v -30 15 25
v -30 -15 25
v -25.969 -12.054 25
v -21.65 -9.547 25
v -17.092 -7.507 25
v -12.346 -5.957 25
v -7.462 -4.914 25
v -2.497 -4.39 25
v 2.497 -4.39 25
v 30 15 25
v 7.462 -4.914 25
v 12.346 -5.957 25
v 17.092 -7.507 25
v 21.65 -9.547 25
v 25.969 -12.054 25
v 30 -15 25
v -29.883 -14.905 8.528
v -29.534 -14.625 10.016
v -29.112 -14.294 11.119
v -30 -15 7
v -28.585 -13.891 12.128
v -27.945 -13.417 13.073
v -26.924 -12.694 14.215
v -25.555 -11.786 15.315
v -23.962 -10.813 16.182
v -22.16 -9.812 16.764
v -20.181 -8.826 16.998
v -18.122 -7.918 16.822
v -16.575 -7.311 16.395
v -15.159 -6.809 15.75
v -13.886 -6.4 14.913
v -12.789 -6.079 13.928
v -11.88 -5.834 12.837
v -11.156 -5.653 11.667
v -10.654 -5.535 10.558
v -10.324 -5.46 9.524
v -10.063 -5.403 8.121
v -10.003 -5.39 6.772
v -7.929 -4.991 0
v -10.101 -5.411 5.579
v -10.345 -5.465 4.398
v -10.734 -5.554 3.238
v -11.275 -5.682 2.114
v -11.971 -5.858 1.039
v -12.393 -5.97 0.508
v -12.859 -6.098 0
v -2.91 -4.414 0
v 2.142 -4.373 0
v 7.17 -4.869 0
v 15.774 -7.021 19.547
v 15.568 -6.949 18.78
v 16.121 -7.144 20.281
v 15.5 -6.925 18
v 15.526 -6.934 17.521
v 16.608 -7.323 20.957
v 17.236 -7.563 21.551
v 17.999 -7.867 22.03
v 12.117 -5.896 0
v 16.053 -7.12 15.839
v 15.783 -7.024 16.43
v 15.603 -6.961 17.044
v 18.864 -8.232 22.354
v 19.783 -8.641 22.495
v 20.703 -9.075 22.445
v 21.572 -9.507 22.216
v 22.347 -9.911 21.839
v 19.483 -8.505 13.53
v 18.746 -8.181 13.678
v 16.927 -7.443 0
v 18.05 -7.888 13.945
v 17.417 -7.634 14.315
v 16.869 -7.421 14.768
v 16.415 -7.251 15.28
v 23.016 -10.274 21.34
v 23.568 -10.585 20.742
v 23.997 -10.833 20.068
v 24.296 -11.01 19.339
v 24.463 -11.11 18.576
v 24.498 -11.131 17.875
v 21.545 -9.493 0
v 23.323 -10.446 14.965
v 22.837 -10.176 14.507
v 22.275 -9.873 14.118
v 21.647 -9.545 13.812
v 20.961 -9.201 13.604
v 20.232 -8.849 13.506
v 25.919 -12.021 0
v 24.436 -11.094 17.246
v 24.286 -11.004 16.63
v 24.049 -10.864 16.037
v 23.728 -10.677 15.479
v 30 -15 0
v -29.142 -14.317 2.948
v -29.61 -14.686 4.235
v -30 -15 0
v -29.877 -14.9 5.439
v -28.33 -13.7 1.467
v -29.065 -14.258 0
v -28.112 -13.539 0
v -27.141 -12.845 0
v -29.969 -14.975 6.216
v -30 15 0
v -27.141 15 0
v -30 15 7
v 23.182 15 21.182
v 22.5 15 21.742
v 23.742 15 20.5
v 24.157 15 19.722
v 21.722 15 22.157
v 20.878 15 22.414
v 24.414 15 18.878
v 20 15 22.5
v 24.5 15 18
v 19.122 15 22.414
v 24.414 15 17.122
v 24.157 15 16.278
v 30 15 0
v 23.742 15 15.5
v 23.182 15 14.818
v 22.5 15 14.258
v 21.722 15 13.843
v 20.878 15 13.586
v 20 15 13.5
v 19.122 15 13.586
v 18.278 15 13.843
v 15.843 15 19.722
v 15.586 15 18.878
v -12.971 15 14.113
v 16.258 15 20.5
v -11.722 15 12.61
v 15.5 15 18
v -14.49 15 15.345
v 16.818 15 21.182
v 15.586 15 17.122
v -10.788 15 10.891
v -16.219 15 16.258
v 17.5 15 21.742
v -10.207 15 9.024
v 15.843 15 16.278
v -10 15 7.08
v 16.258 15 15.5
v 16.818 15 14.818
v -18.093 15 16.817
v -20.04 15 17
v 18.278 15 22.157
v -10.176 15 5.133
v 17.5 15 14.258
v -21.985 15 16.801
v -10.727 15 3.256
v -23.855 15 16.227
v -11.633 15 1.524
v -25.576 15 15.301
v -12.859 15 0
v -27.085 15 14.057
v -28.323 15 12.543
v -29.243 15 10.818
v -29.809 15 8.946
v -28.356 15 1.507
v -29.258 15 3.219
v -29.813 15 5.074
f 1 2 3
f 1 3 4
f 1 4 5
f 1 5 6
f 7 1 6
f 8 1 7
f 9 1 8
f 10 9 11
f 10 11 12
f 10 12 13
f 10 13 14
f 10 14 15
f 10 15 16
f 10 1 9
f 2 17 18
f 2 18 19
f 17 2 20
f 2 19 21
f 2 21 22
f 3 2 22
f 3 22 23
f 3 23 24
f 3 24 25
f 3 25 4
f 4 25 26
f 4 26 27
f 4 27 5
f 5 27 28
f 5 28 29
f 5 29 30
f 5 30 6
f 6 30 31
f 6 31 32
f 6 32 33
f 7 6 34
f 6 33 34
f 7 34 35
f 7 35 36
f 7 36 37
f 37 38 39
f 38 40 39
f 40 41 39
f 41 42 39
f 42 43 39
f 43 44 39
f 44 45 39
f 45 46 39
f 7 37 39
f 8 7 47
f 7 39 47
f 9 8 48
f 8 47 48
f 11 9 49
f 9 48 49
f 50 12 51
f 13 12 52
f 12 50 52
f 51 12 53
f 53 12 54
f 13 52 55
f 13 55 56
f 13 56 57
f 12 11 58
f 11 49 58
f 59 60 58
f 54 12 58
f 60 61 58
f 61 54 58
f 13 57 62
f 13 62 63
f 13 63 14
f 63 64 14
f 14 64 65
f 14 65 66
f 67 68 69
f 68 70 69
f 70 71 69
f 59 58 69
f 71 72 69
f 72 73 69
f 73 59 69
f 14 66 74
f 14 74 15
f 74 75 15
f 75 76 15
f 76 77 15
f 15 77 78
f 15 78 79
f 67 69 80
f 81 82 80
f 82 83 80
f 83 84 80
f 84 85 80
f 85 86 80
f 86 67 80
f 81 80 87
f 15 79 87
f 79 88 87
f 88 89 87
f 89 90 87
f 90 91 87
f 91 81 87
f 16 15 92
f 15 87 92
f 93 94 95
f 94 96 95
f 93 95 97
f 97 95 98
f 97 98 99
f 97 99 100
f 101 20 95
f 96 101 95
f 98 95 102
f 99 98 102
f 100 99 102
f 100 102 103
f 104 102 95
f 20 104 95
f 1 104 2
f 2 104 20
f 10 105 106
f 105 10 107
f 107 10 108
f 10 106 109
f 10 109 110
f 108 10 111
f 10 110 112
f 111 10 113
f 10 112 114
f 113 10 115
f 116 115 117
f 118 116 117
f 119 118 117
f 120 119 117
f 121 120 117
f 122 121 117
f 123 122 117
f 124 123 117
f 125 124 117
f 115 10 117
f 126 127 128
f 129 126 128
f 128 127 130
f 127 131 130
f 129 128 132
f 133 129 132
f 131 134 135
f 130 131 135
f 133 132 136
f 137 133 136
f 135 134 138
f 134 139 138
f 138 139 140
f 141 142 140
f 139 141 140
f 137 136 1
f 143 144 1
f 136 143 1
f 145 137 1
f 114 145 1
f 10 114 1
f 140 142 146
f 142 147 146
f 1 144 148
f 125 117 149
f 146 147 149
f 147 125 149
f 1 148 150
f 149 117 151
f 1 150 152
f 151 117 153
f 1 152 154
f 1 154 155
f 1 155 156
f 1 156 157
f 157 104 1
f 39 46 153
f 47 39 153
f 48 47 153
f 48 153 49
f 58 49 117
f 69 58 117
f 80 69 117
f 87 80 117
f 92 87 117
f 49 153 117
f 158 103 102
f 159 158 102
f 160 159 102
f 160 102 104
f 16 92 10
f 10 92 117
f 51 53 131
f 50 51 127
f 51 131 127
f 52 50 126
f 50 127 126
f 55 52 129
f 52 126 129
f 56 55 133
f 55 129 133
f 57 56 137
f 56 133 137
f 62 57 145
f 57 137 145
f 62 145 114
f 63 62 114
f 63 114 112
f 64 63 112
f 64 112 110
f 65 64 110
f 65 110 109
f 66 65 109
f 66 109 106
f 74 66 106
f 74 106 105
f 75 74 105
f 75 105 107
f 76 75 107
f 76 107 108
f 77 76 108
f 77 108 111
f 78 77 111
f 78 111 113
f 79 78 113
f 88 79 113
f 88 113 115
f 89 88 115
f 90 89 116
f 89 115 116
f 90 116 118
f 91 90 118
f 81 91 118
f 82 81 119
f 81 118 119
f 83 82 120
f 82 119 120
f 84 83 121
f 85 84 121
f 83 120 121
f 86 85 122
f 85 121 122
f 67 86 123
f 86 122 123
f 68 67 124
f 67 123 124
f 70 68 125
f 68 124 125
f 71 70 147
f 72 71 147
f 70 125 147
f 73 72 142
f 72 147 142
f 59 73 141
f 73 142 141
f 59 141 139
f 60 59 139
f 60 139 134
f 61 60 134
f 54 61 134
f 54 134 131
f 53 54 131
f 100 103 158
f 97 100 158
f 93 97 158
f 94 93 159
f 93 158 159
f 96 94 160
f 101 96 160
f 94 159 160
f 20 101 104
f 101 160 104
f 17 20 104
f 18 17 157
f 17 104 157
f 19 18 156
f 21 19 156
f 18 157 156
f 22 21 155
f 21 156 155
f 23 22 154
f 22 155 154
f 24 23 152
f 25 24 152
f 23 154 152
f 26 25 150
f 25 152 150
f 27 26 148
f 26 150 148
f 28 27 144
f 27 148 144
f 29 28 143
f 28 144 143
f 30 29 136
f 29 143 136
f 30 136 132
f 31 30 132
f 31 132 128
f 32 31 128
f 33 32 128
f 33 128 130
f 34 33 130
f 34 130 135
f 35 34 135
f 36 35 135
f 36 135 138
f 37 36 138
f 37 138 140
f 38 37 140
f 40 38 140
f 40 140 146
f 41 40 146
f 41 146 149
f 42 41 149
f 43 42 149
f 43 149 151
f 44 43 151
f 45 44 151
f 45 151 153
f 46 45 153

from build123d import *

# Parameters (mm, degrees)
F1_DEPTH = 25
F2_R     = 4.5
F3_REACH = 56.2498094968


with BuildPart() as f1:
    # F0 (on Top) → F1 (new body)
    with BuildSketch(Plane.XY):
        with BuildLine():
            Line((30, 15), (-30, 15))
            Line((-30, 15), (-30, -15))
            ThreePointArc((-30, -15), (0, -4.3244223472), (30, -15))
            Line((30, -15), (30, 15))
        make_face()
    extrude(amount=F1_DEPTH)

    f3_end = f1.faces().sort_by_distance((0, -4.3244223472, 12.5))[0]
    # F2 (on face) → F3 (cut, up to a face of the model that its end follows)
    with BuildSketch(Plane(origin=(0, 15, 0), x_dir=(-1, 0, 0), z_dir=(0, 1, 0))):
        with BuildLine():
            ThreePointArc((27.1414284285, 0), (29.2578151927, 3.2194103823), (30, 7))
            ThreePointArc((30, 7), (16.2194103823, 16.2578151927), (12.8585715715, 0))
            Line((12.8585715715, 0), (27.1414284285, 0))
        make_face()
        with Locations((-20, 18)):
            Circle(F2_R)
    f3_long = extrude(amount=-F3_REACH, mode=Mode.PRIVATE)
    add(split(f3_long, bisect_by=f3_end, keep=Keep.BOTTOM, mode=Mode.PRIVATE), mode=Mode.SUBTRACT)


solid = f1.part
